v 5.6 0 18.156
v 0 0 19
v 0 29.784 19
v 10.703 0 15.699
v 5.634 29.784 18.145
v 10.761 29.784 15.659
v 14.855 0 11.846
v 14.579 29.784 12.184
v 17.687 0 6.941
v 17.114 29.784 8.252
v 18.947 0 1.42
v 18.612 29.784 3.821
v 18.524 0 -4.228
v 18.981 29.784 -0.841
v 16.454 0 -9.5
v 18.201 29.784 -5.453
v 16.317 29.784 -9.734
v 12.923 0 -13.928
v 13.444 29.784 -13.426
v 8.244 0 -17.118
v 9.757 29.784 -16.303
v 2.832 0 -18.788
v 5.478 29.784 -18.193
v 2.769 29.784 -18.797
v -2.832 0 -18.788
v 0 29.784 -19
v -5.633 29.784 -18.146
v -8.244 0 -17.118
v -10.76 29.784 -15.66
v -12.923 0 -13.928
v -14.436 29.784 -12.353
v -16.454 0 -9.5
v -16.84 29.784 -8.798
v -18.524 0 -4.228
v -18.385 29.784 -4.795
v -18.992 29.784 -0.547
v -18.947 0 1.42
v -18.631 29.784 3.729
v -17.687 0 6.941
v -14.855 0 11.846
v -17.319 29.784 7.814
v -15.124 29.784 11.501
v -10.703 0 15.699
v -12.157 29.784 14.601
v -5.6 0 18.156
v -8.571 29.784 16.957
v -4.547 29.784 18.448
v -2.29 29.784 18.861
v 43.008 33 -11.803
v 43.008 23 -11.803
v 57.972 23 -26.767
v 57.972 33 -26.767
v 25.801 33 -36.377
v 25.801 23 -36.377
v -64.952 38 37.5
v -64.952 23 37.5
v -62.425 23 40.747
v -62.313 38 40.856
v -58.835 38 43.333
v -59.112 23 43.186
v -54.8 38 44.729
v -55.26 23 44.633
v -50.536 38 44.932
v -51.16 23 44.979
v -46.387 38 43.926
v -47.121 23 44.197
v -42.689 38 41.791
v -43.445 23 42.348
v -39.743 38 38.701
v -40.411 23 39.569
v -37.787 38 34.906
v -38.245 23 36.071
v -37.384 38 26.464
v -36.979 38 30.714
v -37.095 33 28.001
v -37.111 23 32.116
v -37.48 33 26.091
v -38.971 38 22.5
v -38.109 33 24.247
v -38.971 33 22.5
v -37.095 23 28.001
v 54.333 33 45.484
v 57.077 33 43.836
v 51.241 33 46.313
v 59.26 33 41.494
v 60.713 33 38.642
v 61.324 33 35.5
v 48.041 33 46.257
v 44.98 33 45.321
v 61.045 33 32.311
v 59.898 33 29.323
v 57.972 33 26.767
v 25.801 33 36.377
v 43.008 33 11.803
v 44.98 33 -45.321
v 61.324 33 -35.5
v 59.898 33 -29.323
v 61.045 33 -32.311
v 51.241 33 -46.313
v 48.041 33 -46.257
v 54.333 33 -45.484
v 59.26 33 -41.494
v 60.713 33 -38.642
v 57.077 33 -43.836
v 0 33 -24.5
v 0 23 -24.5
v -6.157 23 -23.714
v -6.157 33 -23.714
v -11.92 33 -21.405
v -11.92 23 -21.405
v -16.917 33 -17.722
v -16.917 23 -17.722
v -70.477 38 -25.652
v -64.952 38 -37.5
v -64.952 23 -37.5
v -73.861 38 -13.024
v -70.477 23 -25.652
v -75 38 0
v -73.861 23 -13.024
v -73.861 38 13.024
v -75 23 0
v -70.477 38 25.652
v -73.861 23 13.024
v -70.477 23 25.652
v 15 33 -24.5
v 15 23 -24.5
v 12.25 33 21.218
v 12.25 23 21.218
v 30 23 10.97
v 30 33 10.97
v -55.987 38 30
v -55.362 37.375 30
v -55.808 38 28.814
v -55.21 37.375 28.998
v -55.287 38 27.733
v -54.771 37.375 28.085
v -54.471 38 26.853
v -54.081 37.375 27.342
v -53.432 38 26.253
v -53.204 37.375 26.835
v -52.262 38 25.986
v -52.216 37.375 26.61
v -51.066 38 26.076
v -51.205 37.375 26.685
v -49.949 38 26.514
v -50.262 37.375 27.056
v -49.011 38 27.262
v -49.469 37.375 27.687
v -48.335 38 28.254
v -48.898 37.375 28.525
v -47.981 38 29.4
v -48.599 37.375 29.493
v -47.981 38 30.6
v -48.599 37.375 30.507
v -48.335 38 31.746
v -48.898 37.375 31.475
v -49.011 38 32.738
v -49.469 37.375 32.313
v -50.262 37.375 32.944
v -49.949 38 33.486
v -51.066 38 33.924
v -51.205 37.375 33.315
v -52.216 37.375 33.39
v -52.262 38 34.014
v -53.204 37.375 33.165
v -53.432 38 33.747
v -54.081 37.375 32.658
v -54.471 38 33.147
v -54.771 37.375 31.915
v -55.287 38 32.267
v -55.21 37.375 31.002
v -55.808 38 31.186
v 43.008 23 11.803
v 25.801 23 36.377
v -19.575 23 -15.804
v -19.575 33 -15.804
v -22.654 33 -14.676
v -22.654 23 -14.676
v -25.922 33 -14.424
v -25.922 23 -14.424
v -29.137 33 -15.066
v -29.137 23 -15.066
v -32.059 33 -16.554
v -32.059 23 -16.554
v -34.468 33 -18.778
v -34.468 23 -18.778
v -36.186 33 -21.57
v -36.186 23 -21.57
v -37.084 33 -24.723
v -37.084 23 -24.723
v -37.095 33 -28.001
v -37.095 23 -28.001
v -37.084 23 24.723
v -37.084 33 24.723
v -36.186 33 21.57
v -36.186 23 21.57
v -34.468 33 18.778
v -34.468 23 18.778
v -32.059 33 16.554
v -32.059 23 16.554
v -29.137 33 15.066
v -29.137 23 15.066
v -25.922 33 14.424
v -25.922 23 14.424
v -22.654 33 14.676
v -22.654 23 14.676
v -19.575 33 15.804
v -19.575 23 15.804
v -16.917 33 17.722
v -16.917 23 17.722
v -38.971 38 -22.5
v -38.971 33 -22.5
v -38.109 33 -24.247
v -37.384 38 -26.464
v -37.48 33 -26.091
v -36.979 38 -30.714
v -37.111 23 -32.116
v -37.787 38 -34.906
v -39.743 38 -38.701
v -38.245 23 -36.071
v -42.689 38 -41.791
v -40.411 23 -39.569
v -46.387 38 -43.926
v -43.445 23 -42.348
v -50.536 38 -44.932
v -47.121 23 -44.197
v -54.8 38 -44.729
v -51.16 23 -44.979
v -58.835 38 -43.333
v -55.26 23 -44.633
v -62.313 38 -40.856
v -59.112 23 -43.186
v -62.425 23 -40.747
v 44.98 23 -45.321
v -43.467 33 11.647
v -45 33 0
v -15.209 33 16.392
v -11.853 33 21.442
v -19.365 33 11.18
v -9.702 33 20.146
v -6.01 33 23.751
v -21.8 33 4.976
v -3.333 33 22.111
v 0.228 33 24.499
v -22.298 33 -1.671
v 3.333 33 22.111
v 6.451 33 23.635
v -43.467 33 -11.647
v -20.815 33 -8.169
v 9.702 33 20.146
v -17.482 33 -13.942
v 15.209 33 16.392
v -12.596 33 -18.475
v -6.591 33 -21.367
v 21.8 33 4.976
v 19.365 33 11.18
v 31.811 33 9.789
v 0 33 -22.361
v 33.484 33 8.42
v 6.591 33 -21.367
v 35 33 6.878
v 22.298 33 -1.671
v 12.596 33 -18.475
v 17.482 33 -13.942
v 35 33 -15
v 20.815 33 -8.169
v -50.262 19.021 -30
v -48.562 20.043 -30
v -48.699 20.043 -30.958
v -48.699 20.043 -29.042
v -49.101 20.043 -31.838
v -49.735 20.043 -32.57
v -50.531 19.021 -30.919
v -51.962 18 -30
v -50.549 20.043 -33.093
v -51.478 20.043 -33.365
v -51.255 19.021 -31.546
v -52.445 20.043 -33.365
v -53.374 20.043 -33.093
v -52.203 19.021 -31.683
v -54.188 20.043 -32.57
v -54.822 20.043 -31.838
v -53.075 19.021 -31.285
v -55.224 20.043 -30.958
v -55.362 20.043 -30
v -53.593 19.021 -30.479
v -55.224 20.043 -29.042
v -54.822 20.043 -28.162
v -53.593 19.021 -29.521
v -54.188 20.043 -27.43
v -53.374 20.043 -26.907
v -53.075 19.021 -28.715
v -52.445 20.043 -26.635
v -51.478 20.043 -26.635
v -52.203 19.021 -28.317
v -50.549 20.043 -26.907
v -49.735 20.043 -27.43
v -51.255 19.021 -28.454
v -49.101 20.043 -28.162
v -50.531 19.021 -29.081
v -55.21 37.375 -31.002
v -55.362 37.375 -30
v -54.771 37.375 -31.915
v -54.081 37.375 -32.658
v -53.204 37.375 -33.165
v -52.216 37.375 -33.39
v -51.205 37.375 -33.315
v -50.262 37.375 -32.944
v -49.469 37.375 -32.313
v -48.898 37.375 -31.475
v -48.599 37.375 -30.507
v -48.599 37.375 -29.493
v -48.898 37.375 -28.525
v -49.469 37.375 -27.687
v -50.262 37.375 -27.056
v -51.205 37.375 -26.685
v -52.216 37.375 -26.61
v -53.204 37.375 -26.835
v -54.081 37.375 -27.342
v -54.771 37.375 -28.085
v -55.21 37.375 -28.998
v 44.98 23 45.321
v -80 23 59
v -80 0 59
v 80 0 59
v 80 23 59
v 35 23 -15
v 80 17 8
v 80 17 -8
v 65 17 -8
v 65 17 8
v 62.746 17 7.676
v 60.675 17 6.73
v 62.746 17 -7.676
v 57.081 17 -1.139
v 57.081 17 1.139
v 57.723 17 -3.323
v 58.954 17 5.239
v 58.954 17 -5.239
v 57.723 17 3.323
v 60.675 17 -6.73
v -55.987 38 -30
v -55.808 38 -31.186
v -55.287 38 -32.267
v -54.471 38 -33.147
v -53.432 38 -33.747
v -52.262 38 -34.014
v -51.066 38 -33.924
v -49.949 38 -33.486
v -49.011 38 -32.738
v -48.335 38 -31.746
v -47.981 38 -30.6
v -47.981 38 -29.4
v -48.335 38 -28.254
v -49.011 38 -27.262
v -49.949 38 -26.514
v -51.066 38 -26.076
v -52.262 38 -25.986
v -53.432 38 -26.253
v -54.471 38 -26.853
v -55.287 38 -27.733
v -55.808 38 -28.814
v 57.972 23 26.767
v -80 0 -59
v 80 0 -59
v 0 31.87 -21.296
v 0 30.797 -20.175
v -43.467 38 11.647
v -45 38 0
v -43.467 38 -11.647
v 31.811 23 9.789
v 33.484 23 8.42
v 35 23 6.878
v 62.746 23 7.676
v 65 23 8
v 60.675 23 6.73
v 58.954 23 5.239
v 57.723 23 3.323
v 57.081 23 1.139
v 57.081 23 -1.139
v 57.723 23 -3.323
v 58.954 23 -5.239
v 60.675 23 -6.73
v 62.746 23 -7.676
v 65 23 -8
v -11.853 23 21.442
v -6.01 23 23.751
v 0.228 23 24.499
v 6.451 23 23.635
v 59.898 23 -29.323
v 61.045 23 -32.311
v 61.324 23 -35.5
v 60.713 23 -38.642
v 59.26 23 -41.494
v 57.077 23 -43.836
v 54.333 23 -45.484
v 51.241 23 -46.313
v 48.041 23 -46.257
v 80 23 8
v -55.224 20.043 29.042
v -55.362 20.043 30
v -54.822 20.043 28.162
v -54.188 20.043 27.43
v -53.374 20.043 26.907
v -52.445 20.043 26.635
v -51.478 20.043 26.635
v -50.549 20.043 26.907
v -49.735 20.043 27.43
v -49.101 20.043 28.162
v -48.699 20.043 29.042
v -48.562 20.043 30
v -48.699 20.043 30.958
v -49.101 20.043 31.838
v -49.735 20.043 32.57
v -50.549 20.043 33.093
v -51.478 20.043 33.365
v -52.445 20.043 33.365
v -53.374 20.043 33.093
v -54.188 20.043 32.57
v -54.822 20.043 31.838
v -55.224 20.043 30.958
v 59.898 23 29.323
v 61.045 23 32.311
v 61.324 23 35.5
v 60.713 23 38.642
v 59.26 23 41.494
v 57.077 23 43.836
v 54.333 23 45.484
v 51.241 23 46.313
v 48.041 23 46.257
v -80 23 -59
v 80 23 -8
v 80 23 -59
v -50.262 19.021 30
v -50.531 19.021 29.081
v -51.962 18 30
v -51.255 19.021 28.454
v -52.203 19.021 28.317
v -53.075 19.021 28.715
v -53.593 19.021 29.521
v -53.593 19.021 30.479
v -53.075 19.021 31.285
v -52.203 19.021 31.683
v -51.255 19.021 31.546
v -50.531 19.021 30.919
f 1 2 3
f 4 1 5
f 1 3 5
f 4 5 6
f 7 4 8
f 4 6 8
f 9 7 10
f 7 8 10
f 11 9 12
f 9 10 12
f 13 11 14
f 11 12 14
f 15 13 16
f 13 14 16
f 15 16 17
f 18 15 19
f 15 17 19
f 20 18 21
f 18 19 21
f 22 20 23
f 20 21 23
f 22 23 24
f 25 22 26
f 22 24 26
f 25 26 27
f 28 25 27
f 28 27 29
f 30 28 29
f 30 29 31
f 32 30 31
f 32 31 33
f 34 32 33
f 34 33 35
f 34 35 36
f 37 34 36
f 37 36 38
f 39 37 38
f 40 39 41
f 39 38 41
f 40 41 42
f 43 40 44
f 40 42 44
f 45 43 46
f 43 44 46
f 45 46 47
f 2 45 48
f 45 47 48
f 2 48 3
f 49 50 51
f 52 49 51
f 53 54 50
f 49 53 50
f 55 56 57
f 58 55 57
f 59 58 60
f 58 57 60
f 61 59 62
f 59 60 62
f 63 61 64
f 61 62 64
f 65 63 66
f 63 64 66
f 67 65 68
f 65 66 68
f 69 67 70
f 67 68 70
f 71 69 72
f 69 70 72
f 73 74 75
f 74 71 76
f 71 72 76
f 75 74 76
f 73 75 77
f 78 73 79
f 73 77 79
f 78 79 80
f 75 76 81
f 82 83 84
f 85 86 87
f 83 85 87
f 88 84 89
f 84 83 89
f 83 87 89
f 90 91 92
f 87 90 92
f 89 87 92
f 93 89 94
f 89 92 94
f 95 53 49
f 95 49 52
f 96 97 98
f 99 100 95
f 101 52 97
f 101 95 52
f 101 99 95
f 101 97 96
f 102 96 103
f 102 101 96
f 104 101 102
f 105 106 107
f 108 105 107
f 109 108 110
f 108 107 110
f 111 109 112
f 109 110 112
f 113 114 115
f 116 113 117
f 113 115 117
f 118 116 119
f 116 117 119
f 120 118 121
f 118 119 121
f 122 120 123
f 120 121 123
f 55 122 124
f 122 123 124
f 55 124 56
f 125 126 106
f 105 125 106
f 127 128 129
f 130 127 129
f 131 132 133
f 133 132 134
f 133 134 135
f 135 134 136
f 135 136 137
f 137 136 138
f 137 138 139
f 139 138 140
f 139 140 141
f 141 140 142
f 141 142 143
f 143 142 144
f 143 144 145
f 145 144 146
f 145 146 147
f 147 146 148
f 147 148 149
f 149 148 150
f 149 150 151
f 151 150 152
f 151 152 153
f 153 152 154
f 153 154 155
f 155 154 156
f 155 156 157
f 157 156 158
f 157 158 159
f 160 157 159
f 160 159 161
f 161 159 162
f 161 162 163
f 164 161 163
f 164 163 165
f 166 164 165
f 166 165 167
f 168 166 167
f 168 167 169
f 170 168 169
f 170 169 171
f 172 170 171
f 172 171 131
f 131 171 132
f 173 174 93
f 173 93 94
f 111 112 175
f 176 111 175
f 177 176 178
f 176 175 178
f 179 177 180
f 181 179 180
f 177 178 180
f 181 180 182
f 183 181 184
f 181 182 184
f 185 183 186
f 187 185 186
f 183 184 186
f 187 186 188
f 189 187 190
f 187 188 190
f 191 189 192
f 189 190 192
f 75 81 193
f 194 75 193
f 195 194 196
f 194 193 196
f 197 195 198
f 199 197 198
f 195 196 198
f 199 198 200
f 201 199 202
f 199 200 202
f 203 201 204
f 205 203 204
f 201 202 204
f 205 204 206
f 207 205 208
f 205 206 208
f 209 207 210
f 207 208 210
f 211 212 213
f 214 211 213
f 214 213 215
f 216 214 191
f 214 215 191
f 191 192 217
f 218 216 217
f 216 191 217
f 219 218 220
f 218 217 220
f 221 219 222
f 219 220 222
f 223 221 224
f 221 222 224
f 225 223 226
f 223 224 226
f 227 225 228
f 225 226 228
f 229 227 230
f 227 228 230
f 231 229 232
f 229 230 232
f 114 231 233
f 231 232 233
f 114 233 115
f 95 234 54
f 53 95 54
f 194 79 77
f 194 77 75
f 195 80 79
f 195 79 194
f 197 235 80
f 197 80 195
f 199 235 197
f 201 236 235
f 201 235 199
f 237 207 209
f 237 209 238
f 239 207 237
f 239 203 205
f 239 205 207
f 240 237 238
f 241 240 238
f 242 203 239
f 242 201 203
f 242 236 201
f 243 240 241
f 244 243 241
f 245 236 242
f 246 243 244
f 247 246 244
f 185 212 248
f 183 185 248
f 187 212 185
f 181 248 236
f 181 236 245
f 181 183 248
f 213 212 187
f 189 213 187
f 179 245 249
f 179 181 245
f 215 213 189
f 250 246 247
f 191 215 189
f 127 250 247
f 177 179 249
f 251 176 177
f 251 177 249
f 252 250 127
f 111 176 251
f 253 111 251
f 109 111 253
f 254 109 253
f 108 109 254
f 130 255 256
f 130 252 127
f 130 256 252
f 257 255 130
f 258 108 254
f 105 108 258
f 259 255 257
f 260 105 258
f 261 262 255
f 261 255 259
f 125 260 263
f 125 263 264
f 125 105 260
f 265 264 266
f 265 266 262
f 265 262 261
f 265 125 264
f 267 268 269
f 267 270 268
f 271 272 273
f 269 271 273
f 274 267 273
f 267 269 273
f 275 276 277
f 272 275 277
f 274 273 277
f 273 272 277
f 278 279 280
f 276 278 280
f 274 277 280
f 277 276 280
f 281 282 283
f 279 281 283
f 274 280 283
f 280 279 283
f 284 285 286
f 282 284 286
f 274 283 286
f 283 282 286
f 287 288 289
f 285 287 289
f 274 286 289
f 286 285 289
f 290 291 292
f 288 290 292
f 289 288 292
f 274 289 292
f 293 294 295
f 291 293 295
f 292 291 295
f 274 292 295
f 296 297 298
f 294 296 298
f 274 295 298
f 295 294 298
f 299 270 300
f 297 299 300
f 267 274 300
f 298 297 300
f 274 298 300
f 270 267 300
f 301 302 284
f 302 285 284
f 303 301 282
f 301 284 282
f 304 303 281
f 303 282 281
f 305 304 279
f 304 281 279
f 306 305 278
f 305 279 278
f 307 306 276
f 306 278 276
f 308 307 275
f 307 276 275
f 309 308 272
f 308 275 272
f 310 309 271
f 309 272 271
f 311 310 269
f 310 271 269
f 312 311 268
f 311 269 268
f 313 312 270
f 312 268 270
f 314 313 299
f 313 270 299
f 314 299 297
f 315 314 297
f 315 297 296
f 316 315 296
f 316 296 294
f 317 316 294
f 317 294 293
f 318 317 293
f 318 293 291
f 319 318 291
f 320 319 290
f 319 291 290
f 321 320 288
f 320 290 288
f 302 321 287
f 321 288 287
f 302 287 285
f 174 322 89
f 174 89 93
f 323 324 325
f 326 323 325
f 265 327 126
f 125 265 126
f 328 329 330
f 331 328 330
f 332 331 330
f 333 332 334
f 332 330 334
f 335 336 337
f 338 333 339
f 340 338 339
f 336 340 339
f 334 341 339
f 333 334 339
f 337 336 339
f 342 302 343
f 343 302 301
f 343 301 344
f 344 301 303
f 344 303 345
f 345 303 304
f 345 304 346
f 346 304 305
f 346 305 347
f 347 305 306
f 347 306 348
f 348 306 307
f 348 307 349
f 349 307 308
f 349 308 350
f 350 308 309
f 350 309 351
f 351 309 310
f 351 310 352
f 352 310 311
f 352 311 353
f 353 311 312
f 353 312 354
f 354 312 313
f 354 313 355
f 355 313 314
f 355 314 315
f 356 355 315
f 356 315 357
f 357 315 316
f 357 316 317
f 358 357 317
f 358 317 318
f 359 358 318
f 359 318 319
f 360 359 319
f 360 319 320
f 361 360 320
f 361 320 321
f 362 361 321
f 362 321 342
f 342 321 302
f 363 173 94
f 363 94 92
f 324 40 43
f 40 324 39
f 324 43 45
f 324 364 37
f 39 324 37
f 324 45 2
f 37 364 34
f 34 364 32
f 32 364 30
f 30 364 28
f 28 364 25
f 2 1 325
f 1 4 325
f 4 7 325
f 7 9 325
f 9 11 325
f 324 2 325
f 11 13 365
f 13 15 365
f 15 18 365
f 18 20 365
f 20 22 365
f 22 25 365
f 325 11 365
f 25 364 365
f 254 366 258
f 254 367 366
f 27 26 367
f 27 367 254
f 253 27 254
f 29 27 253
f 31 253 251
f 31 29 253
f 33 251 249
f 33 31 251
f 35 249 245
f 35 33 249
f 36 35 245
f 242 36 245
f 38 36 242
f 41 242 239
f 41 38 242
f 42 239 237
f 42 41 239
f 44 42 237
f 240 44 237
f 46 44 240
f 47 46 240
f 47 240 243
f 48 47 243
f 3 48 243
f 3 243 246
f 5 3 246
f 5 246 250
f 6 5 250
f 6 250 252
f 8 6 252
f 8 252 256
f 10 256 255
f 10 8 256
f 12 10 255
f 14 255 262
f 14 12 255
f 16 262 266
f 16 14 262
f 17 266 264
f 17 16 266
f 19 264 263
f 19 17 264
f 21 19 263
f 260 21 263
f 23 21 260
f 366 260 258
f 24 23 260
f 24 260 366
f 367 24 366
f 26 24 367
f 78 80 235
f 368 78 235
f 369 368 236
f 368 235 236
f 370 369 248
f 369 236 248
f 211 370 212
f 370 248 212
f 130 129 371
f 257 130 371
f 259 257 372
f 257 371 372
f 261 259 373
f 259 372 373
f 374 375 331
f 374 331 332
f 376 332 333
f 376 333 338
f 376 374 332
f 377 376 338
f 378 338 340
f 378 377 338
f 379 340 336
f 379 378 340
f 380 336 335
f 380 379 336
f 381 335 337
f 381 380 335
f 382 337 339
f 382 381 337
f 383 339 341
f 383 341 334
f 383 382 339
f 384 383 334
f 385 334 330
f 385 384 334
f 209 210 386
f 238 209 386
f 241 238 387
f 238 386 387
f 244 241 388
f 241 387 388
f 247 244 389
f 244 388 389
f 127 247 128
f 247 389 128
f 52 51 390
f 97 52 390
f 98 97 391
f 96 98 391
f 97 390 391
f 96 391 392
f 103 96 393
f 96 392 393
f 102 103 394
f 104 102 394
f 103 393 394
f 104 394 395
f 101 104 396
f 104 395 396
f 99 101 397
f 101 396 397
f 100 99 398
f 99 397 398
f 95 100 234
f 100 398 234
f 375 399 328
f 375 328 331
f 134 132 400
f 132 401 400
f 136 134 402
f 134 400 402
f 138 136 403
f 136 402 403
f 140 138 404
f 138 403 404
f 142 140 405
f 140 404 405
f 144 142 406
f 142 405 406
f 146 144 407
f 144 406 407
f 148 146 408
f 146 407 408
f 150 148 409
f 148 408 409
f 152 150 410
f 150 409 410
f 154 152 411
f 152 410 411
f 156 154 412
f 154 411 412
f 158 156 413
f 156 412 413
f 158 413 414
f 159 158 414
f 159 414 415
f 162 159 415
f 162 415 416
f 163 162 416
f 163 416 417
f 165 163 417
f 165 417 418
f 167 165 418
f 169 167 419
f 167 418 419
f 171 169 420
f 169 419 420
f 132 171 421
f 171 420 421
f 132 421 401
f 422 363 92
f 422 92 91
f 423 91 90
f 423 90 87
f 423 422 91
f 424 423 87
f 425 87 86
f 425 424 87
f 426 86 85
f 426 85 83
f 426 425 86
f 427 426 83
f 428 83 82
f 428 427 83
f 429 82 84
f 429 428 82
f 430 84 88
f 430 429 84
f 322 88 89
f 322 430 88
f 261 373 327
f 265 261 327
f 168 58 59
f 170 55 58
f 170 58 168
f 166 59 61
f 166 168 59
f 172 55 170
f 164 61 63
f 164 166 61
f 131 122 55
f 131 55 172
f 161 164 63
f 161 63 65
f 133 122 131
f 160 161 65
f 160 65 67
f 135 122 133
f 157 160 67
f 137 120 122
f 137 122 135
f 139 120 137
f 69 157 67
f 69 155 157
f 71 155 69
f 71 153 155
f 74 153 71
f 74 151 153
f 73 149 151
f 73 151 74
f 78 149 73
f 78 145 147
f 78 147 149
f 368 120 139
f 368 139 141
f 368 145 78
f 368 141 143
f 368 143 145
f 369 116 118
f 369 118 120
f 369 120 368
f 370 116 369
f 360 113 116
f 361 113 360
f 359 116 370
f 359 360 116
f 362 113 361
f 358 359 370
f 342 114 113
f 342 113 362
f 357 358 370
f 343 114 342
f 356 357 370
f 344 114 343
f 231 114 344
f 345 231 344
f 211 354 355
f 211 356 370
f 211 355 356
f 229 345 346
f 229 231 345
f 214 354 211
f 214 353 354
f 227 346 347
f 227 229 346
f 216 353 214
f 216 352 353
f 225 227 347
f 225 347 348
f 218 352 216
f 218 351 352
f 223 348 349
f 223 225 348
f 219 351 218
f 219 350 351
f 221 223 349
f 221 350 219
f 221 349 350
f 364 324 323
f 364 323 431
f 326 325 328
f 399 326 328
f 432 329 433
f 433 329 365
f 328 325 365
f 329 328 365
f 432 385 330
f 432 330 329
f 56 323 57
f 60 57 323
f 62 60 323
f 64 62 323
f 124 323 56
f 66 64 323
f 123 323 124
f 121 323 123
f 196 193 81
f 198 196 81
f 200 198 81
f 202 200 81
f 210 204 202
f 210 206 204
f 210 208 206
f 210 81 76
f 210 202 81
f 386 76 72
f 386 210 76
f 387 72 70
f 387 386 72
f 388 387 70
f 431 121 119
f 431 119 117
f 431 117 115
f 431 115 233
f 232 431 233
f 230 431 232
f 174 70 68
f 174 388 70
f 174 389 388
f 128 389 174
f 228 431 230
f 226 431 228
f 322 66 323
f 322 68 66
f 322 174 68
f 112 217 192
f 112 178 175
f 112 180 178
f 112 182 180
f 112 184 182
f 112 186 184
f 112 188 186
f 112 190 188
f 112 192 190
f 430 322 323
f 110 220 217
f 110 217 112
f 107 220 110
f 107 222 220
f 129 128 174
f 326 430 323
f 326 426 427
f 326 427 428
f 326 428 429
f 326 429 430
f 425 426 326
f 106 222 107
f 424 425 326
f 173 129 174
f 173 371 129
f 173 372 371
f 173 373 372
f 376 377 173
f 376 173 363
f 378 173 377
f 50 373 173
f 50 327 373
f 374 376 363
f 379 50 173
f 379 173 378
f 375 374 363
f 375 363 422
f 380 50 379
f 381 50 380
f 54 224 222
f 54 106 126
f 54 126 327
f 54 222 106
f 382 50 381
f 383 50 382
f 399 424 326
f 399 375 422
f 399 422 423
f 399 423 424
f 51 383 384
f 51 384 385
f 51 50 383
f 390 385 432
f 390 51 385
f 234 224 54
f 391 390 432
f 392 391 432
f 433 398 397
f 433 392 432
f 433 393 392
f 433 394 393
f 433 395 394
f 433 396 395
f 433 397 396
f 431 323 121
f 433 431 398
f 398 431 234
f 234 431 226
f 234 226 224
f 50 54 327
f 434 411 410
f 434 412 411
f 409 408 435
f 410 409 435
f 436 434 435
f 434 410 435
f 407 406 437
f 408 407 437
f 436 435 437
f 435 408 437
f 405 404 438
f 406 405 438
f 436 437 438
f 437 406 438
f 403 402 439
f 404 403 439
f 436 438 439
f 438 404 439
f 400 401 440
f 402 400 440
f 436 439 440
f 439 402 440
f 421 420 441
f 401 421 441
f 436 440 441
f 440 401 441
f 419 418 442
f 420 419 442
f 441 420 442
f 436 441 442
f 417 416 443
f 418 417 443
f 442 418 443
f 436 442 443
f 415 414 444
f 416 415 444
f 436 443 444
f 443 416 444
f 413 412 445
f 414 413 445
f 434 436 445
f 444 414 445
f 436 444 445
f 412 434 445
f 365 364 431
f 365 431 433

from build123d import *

# Parameters (mm, degrees)
SKETCH_1_W                   = 160
SKETCH_1_H                   = 118
EXTRUDE_1_DEPTH              = 23
EXTRUDE_2_DEPTH              = 38
HOLE_WIZARD_M8_2_D           = 6.8
HOLE_WIZARD_M8_2_DEPTH       = 17.957073895
HOLE_WIZARD_M8_2_CSINK_D     = 8.05
HOLE_WIZARD_M8_2_CSINK_ANGLE = 90
HOLE_WIZARD_M8_2_TIP         = 2.042926105
EXTRUDE_3_DEPTH              = 10
EXTRUDE_4_DEPTH              = 10
SKETCH_9_R                   = 19
CUT_EXTRUDE_1_DEPTH          = 105.737767782
CUT_EXTRUDE_2_DEPTH          = 6


with BuildPart() as part:
    # 草图1 → 凸台-拉伸1 (new body)
    with BuildSketch(Plane(origin=(0, 0, 0), x_dir=(1, 0, 0), z_dir=(0, 1, 0))):
        Rectangle(SKETCH_1_W, SKETCH_1_H)
    extrude(amount=EXTRUDE_1_DEPTH)

    # 草图1<3> → 凸台-拉伸2 (add)
    with BuildSketch(Plane(origin=(0, 0, 0), x_dir=(1, 0, 0), z_dir=(0, 1, 0))):
        with BuildLine():
            ThreePointArc((-38.97114317, 22.5), (-44.461524227, 42.990381057), (-64.951905284, 37.5))
            ThreePointArc((-64.951905284, 37.5), (-75, 0), (-64.951905284, -37.5))
            ThreePointArc((-64.951905284, -37.5), (-44.461524227, -42.990381057), (-38.97114317, -22.5))
            ThreePointArc((-38.97114317, -22.5), (-45, 0), (-38.97114317, 22.5))
        make_face()
    extrude(amount=EXTRUDE_2_DEPTH)

    # M8 螺纹孔2
    with Locations(Plane(origin=(0, 38, 0), x_dir=(1, 0, 0), z_dir=(0, 1, 0))):
        with Locations((-51.961524227, 30), (-51.961524227, -30)):
            CounterSinkHole(HOLE_WIZARD_M8_2_D / 2, HOLE_WIZARD_M8_2_CSINK_D / 2, depth=HOLE_WIZARD_M8_2_DEPTH, counter_sink_angle=HOLE_WIZARD_M8_2_CSINK_ANGLE)
            with Locations((0, 0, -(HOLE_WIZARD_M8_2_DEPTH + HOLE_WIZARD_M8_2_TIP / 2))):  # 118° drill point
                Cone(0, HOLE_WIZARD_M8_2_D / 2, HOLE_WIZARD_M8_2_TIP, mode=Mode.SUBTRACT)

    # 草图6 → 凸台-拉伸3 (add)
    with BuildSketch(Plane(origin=(0, 23, 0), x_dir=(1, 0, 0), z_dir=(0, 1, 0))):
        with BuildLine():
            Line((15, 24.5), (0, 24.5))
            ThreePointArc((0, 24.5), (-9.111917465, 22.742536361), (-16.916580755, 17.722282459))
            ThreePointArc((-16.916580755, 17.722282459), (-30.649129847, 15.709991673), (-37.095262413, 28.001435595))
            ThreePointArc((-37.095262413, 28.001435595), (-37.764179884, 25.158986305), (-38.97114317, 22.5))
            ThreePointArc((-38.97114317, 22.5), (-45, 0), (-38.97114317, -22.5))
            ThreePointArc((-38.97114317, -22.5), (-37.764179884, -25.158986305), (-37.095262413, -28.001435595))
            ThreePointArc((-37.095262413, -28.001435595), (-30.649129847, -15.709991673), (-16.916580755, -17.722282459))
            ThreePointArc((-16.916580755, -17.722282459), (-2.915234862, -24.325941003), (12.25, -21.217622393))
            Line((12.25, -21.217622393), (30, -10.969655115))
            ThreePointArc((30, -10.969655115), (32.66631784, -9.127014863), (35, -6.877903594))
            Line((35, -6.877903594), (35, 15))
            Line((35, 15), (15, 24.5))
        make_face()
    extrude(amount=EXTRUDE_3_DEPTH)

    # 草图8 → 凸台-拉伸4 (add)
    with BuildSketch(Plane(origin=(0, 23, 0), x_dir=(1, 0, 0), z_dir=(0, 1, 0))):
        with BuildLine():
            Line((25.800739315, 36.377490991), (43.008032405, 11.802929662))
            Line((43.008032405, 11.802929662), (57.971696229, 26.766593486))
            ThreePointArc((57.971696229, 26.766593486), (59.260216754, 41.494450487), (44.979858235, 45.32086102))
            Line((44.979858235, 45.32086102), (25.800739315, 36.377490991))
        make_face()
        with BuildLine():
            Line((43.008032405, -11.802929662), (57.971696229, -26.766593486))
            ThreePointArc((57.971696229, -26.766593486), (59.260216754, -41.494450487), (44.979858235, -45.32086102))
            Line((44.979858235, -45.32086102), (25.800739315, -36.377490991))
            Line((25.800739315, -36.377490991), (43.008032405, -11.802929662))
        make_face()
    extrude(amount=EXTRUDE_4_DEPTH)

    # 草图9 → 切除-拉伸1 (cut, through all)
    with BuildSketch(Plane(origin=(0, 33, 0), x_dir=(1, 0, 0), z_dir=(0, 1, 0))):
        Circle(SKETCH_9_R)
    extrude(amount=-CUT_EXTRUDE_1_DEPTH, mode=Mode.SUBTRACT)

    # 草图10 → 切除-旋转5 (revolve, cut)
    with BuildSketch(Plane.XY):
        with BuildLine():
            Line((0, 83), (0, 23))
            ThreePointArc((0, 23), (21.213203436, 31.786796564), (30, 53))
            ThreePointArc((30, 53), (21.213203436, 74.213203436), (0, 83))
        make_face()
    revolve(axis=Axis((0, 23, 0), (0, 1, 0)), mode=Mode.SUBTRACT)

    # 草图11 → 切除-拉伸2 (cut)
    with BuildSketch(Plane(origin=(0, 23, 0), x_dir=(1, 0, 0), z_dir=(0, 1, 0))):
        with BuildLine():
            Line((95, -8), (65, -8))
            ThreePointArc((65, -8), (57, 0), (65, 8))
            Line((65, 8), (95, 8))
            ThreePointArc((95, 8), (103, 0), (95, -8))
        make_face()
    extrude(amount=-CUT_EXTRUDE_2_DEPTH, mode=Mode.SUBTRACT)


solid = part.part
